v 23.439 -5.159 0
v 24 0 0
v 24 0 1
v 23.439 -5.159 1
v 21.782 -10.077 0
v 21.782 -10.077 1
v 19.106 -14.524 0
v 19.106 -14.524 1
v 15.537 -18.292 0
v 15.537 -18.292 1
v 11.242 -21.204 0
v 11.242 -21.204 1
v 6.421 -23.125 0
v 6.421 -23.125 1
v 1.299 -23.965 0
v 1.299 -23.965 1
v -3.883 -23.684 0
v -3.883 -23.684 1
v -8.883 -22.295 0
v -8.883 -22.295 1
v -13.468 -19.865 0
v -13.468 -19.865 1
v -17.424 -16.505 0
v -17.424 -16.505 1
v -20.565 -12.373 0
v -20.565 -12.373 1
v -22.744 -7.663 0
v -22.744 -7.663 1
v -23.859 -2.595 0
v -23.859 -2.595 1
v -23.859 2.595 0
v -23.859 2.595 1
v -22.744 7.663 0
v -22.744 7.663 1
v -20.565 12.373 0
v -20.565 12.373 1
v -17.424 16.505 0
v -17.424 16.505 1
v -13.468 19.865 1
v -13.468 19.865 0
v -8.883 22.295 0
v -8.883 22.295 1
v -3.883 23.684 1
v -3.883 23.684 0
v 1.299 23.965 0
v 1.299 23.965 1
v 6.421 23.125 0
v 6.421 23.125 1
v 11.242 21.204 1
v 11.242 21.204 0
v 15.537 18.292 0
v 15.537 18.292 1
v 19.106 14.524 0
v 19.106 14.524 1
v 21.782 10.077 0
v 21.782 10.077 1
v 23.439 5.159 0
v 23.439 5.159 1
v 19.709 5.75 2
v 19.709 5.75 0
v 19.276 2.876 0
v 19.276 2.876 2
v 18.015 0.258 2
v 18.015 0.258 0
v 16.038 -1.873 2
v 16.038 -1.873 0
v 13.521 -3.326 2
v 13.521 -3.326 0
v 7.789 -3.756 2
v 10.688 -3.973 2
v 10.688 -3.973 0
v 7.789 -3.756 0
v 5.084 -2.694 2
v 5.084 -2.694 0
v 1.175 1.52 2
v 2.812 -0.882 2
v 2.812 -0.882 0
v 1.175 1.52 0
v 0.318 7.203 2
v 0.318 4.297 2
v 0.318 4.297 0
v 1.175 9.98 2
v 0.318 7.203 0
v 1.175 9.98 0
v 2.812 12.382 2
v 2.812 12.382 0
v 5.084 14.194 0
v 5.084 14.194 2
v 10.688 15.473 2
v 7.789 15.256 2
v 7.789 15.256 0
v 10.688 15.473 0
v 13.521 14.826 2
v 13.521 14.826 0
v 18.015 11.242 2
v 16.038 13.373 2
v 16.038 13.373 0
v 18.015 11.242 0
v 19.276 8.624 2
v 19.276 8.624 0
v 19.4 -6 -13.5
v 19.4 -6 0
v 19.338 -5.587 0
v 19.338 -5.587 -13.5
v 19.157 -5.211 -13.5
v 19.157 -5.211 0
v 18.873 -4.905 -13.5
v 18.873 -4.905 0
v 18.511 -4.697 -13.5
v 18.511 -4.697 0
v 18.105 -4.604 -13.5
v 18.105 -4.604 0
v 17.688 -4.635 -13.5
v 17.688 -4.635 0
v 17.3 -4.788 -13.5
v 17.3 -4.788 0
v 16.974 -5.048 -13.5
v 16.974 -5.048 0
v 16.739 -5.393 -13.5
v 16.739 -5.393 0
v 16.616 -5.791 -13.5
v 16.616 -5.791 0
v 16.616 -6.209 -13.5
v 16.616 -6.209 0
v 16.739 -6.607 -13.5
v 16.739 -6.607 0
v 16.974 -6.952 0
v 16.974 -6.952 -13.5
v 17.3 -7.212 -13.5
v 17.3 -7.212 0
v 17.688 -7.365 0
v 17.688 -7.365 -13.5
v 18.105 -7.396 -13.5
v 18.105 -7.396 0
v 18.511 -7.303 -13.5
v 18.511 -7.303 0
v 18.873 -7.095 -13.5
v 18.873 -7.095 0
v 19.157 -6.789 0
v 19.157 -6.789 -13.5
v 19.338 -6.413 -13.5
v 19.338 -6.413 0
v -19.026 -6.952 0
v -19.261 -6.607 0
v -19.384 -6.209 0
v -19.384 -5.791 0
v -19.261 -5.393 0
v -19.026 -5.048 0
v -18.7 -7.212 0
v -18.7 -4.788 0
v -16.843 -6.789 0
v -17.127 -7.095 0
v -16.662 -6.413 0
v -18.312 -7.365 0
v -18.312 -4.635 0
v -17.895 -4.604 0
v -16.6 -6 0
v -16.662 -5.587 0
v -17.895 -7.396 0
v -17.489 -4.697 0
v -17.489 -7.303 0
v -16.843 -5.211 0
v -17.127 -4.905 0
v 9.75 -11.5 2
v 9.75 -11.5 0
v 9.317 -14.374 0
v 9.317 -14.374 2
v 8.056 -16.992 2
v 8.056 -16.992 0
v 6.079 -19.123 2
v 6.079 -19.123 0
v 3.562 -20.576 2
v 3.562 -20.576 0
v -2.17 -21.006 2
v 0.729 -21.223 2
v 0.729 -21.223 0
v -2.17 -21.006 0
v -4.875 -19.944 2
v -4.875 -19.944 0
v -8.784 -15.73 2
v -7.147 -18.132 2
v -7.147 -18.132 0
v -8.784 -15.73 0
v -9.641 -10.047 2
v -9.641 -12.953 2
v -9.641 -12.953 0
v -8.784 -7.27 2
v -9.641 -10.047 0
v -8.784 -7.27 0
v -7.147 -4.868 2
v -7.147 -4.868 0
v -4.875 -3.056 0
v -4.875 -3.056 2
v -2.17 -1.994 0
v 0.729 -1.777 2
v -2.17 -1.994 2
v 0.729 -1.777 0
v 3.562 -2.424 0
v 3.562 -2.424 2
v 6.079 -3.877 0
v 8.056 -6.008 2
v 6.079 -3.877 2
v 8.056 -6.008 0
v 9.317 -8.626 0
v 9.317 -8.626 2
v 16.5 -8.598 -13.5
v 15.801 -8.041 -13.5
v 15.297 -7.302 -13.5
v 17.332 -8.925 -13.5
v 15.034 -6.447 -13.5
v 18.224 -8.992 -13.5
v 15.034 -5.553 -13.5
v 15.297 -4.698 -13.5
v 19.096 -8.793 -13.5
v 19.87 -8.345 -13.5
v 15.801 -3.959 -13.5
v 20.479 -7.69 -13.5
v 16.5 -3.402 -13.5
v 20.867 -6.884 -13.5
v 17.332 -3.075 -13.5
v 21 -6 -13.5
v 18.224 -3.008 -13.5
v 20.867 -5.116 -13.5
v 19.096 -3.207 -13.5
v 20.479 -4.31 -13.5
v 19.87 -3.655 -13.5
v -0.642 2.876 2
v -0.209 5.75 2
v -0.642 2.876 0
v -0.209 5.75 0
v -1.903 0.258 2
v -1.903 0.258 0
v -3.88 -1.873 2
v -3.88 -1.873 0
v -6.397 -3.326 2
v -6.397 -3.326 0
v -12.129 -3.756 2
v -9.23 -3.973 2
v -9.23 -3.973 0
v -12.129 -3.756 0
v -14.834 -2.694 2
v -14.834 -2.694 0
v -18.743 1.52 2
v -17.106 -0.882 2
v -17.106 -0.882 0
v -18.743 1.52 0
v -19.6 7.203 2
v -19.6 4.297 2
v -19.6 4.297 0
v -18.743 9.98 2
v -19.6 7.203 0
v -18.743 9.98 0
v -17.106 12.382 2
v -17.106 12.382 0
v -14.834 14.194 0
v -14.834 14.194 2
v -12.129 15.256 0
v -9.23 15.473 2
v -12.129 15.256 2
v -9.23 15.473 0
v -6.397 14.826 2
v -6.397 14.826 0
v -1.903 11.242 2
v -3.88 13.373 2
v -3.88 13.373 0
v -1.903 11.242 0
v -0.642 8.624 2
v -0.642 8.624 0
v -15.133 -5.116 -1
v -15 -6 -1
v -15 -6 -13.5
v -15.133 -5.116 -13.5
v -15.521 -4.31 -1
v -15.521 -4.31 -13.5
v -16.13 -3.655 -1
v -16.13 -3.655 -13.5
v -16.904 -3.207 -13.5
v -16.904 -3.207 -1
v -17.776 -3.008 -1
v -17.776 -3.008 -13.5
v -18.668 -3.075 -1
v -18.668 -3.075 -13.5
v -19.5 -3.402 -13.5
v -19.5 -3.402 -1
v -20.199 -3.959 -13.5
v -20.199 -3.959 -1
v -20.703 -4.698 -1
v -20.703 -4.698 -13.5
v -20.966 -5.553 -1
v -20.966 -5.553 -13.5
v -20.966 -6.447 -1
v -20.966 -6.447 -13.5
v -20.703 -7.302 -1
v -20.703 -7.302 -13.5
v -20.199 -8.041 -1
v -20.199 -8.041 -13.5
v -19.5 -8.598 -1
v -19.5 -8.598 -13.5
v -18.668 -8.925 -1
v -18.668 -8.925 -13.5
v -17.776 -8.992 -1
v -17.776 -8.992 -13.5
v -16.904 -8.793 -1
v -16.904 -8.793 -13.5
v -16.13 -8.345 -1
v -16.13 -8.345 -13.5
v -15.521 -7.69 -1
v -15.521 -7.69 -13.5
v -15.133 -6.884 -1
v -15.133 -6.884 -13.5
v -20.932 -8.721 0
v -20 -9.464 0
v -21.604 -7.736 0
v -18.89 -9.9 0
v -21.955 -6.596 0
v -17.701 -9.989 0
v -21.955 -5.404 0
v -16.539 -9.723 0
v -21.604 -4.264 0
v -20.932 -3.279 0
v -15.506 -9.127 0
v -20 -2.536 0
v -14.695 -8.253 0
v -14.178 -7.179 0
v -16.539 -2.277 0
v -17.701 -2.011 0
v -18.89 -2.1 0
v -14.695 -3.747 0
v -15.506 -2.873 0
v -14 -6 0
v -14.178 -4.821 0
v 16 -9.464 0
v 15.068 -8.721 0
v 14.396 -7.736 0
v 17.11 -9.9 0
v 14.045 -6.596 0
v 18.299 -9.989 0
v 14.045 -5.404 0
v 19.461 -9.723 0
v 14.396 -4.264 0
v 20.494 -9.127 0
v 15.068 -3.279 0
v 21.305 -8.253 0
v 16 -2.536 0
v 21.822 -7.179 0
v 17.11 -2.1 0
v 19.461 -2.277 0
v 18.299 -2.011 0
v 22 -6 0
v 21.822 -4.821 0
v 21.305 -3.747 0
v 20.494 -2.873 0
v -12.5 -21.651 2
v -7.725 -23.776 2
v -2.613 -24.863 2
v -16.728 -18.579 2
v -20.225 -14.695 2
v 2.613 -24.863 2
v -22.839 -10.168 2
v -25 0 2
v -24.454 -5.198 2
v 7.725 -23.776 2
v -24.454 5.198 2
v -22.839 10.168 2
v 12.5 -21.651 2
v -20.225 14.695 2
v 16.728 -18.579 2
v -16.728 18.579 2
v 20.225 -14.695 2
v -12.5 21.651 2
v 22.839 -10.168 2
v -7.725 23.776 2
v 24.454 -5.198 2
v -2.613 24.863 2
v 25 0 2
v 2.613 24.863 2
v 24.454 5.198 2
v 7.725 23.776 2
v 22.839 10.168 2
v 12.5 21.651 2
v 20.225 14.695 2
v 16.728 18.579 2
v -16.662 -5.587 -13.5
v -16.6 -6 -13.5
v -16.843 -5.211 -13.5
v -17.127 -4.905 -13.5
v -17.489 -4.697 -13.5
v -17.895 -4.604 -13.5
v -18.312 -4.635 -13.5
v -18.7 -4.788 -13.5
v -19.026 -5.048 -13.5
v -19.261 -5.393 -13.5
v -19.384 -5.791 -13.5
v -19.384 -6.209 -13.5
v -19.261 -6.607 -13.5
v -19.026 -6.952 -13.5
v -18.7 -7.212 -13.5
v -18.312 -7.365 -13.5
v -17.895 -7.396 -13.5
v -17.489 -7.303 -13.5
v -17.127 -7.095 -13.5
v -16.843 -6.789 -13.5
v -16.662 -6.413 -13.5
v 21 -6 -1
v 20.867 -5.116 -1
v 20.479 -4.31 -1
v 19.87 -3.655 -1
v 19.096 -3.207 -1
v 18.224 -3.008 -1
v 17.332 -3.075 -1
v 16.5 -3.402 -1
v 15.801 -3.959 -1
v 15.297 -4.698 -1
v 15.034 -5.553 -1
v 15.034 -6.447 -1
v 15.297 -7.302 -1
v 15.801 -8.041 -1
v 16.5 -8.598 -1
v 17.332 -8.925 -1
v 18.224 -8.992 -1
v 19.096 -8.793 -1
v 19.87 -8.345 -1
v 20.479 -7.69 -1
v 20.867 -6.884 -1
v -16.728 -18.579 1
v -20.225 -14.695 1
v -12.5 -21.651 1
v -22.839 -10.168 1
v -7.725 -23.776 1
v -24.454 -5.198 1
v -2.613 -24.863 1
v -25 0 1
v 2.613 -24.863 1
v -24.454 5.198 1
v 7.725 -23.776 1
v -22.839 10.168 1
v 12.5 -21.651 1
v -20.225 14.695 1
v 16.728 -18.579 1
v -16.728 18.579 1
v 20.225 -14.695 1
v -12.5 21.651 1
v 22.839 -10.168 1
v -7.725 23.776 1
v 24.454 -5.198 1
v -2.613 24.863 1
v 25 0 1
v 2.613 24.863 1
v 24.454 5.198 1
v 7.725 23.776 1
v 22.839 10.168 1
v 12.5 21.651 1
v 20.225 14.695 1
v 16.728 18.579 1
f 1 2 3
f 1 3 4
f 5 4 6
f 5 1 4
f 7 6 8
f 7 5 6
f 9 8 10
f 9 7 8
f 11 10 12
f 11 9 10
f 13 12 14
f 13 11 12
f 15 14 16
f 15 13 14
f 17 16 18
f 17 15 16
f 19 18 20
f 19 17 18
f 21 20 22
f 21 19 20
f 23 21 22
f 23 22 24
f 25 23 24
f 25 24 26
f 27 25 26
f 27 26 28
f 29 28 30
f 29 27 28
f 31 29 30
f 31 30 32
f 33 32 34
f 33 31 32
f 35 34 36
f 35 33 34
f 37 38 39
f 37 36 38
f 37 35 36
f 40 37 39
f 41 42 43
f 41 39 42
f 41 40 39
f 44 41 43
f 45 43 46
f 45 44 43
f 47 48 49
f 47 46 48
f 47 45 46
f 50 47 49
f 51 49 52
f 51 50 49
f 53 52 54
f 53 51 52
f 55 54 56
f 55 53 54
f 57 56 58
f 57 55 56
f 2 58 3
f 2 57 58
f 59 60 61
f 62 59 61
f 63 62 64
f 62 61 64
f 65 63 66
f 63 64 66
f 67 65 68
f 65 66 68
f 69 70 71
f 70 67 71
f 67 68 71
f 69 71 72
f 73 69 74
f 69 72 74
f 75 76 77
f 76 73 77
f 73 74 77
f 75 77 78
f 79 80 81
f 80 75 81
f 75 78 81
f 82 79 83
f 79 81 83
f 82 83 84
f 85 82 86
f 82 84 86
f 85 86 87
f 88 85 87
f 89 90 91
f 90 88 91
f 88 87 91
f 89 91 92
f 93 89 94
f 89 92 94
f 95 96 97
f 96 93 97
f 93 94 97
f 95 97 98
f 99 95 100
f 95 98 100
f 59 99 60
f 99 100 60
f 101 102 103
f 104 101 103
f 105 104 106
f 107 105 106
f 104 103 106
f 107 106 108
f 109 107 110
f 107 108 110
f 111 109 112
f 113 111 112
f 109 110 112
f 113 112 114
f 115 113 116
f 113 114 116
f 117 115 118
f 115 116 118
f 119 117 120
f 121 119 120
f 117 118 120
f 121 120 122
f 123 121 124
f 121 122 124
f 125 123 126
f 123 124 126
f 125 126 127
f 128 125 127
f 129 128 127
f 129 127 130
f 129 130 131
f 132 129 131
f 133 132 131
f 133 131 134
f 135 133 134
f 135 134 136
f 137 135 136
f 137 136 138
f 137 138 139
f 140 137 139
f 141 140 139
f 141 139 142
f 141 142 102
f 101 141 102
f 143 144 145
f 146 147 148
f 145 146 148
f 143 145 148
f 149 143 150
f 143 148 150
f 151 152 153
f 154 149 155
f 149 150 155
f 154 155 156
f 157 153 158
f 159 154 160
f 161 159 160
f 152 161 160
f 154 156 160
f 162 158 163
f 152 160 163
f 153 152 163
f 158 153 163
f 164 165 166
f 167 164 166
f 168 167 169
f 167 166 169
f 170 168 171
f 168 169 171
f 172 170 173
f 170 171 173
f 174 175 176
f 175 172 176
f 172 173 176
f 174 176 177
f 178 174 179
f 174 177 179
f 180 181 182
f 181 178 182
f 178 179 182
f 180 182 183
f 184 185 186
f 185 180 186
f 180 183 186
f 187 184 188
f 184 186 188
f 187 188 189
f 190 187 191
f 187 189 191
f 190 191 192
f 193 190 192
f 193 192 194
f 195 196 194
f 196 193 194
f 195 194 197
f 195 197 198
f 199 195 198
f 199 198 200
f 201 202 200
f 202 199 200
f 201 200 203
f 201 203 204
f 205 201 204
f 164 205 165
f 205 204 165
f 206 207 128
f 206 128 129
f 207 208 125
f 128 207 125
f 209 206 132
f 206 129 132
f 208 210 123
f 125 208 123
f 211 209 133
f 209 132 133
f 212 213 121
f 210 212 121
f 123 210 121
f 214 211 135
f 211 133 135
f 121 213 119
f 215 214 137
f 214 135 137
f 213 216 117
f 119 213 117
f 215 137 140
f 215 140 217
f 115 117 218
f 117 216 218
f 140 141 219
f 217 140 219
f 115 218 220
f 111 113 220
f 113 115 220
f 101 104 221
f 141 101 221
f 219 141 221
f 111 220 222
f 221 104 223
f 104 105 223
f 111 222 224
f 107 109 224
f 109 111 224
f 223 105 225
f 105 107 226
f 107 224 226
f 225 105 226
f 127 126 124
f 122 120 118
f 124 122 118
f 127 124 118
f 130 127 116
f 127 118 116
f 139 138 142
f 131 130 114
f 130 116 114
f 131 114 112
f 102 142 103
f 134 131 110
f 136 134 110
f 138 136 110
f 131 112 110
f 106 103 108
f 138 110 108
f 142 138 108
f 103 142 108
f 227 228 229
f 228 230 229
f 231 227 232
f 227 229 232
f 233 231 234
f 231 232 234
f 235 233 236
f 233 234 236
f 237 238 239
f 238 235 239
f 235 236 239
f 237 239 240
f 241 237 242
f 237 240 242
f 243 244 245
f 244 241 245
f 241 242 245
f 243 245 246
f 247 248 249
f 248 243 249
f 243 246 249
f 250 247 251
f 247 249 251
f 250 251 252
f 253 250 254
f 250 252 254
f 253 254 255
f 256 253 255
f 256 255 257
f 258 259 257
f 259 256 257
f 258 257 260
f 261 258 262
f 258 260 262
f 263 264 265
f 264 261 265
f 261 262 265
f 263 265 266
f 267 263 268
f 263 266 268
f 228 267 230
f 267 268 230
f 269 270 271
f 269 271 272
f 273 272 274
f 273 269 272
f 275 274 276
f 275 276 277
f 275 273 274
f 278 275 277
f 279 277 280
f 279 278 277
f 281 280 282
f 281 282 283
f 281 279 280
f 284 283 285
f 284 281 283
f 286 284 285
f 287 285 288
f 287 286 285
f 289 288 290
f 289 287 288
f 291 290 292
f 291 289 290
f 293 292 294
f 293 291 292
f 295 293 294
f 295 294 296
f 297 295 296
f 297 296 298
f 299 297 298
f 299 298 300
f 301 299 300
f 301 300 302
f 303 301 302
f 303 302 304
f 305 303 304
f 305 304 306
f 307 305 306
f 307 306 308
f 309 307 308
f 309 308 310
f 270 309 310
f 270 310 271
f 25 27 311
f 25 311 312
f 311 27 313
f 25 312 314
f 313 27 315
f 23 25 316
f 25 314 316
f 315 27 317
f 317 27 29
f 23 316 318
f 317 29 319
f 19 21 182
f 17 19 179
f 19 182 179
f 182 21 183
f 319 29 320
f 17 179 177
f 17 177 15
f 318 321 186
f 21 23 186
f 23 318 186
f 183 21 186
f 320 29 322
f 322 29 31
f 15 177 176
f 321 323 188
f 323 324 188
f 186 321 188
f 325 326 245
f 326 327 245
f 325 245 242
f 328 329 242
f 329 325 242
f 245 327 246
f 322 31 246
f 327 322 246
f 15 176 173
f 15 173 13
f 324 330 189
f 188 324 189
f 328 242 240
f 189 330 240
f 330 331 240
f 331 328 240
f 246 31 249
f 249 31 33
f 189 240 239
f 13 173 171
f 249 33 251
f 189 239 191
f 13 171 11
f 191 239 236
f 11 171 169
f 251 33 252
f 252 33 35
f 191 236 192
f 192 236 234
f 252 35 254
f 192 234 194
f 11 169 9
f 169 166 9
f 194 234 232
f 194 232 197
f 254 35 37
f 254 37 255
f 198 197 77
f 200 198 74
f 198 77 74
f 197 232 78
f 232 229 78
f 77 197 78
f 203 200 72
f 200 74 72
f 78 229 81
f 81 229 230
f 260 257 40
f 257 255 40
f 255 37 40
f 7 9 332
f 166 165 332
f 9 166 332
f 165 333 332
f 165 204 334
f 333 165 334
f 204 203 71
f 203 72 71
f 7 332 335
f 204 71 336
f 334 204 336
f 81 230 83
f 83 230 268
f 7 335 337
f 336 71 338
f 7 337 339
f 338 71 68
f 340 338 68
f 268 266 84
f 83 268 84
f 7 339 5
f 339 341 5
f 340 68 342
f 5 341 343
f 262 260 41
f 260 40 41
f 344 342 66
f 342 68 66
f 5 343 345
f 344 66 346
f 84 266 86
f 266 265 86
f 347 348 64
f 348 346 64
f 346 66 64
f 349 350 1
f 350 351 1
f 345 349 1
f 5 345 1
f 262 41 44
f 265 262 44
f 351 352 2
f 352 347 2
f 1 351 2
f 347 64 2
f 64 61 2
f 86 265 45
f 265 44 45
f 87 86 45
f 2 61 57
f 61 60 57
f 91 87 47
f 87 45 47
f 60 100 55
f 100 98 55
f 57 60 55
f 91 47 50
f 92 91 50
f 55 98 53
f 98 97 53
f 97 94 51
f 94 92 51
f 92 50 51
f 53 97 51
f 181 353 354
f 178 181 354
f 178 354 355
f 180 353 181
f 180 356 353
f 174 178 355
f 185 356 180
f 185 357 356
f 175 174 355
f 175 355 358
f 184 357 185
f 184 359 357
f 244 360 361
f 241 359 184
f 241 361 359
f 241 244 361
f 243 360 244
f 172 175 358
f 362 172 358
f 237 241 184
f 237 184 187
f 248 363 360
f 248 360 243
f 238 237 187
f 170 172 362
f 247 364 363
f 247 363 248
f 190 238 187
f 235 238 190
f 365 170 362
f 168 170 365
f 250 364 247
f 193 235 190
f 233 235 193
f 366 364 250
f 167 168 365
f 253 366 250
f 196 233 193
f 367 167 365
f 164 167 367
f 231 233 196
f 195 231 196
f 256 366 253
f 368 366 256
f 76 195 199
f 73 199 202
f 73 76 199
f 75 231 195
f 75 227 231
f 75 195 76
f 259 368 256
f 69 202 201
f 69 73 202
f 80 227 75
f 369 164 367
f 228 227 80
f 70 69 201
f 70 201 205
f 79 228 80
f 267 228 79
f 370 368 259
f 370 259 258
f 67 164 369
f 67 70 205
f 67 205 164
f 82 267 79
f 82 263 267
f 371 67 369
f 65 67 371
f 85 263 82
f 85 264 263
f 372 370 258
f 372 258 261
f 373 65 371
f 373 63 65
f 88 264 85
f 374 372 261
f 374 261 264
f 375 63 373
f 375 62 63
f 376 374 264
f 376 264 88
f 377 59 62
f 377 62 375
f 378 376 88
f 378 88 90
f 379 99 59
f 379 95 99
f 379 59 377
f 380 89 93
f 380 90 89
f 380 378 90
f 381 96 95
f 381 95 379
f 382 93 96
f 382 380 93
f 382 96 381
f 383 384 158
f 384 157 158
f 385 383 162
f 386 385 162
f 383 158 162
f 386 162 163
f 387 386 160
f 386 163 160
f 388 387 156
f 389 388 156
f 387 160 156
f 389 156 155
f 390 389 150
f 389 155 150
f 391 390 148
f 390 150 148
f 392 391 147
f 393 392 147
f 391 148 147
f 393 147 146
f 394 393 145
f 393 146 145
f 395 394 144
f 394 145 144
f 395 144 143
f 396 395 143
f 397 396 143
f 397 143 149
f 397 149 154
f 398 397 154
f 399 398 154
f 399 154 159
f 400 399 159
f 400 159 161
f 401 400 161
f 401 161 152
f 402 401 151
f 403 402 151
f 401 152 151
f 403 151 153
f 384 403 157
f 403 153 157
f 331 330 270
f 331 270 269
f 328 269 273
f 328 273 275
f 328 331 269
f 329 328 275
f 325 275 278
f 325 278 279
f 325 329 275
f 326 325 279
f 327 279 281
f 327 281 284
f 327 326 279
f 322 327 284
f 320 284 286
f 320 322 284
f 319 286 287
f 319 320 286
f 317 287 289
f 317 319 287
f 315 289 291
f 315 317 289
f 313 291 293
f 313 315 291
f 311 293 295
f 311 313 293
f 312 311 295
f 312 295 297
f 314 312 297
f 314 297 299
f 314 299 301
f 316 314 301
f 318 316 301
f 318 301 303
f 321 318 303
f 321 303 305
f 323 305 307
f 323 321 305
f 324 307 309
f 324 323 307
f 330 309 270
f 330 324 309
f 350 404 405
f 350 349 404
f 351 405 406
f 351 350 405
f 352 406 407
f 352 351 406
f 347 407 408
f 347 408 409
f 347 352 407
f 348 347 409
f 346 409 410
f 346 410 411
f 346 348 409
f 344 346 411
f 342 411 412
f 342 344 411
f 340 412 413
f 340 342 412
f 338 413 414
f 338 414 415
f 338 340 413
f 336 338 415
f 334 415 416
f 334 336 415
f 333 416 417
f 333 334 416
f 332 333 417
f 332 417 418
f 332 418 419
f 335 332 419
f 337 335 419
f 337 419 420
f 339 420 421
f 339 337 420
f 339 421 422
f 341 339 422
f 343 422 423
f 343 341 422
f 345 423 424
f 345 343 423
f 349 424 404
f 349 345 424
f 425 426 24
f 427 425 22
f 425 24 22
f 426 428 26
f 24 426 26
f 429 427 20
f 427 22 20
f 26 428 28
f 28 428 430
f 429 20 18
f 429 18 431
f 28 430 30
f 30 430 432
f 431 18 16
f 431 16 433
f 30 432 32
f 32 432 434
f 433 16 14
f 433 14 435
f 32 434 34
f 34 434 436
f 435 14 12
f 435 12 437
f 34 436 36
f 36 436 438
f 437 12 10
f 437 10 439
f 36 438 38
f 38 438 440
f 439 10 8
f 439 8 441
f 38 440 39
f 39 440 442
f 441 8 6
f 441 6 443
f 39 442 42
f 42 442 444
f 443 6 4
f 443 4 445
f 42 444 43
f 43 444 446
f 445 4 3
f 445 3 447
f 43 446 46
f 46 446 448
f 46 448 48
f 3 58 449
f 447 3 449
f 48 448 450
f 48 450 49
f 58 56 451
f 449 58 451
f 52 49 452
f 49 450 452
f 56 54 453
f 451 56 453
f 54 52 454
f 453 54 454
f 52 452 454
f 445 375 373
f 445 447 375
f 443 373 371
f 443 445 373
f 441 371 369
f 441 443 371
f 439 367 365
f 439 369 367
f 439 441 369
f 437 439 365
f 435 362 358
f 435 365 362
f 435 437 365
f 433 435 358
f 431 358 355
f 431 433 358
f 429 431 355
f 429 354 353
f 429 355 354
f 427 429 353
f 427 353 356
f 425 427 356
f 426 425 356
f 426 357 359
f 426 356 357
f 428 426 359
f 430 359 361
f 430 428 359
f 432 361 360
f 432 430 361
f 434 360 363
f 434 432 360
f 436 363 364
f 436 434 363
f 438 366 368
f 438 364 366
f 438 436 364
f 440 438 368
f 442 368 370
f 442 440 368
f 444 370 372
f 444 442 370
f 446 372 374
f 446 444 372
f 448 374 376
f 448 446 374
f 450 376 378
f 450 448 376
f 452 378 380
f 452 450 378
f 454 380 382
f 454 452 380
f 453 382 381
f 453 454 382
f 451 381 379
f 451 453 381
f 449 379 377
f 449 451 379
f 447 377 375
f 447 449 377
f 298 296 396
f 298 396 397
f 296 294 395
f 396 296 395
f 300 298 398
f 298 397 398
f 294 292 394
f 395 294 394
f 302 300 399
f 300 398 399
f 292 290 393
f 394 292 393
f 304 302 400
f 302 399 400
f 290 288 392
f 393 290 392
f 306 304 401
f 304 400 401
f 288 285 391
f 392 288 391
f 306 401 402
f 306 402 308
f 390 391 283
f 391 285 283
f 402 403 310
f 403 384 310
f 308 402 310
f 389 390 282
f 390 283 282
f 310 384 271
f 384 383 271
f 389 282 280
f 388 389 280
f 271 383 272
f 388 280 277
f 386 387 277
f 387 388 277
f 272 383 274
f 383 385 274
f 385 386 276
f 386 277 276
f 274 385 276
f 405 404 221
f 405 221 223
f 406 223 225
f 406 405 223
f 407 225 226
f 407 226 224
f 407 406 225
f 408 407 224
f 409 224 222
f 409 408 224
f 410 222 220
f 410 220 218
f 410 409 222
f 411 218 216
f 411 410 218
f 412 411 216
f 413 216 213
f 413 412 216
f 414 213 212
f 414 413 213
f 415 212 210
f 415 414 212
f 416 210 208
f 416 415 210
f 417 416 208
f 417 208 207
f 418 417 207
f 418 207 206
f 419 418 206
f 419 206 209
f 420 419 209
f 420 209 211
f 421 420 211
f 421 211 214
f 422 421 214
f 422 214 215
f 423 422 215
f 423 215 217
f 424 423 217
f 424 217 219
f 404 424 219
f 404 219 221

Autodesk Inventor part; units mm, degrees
ref_plane "YZ Plane" through (0, 0, 0) normal (1, 0, 0) x (0, 1, 0)
ref_plane "XZ Plane" through (0, 0, 0) normal (0, 1, 0) x (-1, 0, 0)
ref_plane "XY Plane" through (0, 0, 0) normal (0, 0, 1) x (1, 0, 0)
sketch "Sketch1" plane through (0, 0, 0) normal (0, 0, 1) x (1, 0, 0)
  circle A0 centre (-9.959, 5.75) radius 9.75
  circle A1 centre (0, -11.5) radius 9.75
  circle A2 centre (9.959, 5.75) radius 9.75
  circle A3 centre (0, 0) radius 25
  circle A4 centre (-18, -6) radius 1.4
  circle A5 centre (18, -6) radius 1.4
  circle A6 centre (18, -6) radius 3
  circle A7 centre (-18, -6) radius 3
  circle A8 centre (0, 0) radius 24
  dimension "d0" = 19.918
  dimension "d1" = 5.75
  dimension "d3" = 19.5
  dimension "d4" = 9.959
  dimension "d5" = 17.25
  dimension "d6" = 50
  dimension "d9" = 18
  dimension "d10" = 18
  dimension "d11" = 6
  dimension "d12" = 2.8
  dimension "d13" = 6
  dimension "d20" = 1
extrude "Extrusion1" add sketch "Sketch1" along normal blind 2 contours A3 | A4 | A5 | A6 | A7 | A8
extrude "Extrusion2" add sketch "Sketch1" against normal blind 13.5 contours A6 | A7
chamfer "Chamfer1" distance 1 angle 45 2 edges at (15, -6, 0) (-21, -6, 0)
extrude "Extrusion3" cut sketch "Sketch1" along normal blind 1 contours A3
equation "\"d4\" = 0.5 * d0"
equation "\"d10\" = d9"
properties part number "Housing_Front"
